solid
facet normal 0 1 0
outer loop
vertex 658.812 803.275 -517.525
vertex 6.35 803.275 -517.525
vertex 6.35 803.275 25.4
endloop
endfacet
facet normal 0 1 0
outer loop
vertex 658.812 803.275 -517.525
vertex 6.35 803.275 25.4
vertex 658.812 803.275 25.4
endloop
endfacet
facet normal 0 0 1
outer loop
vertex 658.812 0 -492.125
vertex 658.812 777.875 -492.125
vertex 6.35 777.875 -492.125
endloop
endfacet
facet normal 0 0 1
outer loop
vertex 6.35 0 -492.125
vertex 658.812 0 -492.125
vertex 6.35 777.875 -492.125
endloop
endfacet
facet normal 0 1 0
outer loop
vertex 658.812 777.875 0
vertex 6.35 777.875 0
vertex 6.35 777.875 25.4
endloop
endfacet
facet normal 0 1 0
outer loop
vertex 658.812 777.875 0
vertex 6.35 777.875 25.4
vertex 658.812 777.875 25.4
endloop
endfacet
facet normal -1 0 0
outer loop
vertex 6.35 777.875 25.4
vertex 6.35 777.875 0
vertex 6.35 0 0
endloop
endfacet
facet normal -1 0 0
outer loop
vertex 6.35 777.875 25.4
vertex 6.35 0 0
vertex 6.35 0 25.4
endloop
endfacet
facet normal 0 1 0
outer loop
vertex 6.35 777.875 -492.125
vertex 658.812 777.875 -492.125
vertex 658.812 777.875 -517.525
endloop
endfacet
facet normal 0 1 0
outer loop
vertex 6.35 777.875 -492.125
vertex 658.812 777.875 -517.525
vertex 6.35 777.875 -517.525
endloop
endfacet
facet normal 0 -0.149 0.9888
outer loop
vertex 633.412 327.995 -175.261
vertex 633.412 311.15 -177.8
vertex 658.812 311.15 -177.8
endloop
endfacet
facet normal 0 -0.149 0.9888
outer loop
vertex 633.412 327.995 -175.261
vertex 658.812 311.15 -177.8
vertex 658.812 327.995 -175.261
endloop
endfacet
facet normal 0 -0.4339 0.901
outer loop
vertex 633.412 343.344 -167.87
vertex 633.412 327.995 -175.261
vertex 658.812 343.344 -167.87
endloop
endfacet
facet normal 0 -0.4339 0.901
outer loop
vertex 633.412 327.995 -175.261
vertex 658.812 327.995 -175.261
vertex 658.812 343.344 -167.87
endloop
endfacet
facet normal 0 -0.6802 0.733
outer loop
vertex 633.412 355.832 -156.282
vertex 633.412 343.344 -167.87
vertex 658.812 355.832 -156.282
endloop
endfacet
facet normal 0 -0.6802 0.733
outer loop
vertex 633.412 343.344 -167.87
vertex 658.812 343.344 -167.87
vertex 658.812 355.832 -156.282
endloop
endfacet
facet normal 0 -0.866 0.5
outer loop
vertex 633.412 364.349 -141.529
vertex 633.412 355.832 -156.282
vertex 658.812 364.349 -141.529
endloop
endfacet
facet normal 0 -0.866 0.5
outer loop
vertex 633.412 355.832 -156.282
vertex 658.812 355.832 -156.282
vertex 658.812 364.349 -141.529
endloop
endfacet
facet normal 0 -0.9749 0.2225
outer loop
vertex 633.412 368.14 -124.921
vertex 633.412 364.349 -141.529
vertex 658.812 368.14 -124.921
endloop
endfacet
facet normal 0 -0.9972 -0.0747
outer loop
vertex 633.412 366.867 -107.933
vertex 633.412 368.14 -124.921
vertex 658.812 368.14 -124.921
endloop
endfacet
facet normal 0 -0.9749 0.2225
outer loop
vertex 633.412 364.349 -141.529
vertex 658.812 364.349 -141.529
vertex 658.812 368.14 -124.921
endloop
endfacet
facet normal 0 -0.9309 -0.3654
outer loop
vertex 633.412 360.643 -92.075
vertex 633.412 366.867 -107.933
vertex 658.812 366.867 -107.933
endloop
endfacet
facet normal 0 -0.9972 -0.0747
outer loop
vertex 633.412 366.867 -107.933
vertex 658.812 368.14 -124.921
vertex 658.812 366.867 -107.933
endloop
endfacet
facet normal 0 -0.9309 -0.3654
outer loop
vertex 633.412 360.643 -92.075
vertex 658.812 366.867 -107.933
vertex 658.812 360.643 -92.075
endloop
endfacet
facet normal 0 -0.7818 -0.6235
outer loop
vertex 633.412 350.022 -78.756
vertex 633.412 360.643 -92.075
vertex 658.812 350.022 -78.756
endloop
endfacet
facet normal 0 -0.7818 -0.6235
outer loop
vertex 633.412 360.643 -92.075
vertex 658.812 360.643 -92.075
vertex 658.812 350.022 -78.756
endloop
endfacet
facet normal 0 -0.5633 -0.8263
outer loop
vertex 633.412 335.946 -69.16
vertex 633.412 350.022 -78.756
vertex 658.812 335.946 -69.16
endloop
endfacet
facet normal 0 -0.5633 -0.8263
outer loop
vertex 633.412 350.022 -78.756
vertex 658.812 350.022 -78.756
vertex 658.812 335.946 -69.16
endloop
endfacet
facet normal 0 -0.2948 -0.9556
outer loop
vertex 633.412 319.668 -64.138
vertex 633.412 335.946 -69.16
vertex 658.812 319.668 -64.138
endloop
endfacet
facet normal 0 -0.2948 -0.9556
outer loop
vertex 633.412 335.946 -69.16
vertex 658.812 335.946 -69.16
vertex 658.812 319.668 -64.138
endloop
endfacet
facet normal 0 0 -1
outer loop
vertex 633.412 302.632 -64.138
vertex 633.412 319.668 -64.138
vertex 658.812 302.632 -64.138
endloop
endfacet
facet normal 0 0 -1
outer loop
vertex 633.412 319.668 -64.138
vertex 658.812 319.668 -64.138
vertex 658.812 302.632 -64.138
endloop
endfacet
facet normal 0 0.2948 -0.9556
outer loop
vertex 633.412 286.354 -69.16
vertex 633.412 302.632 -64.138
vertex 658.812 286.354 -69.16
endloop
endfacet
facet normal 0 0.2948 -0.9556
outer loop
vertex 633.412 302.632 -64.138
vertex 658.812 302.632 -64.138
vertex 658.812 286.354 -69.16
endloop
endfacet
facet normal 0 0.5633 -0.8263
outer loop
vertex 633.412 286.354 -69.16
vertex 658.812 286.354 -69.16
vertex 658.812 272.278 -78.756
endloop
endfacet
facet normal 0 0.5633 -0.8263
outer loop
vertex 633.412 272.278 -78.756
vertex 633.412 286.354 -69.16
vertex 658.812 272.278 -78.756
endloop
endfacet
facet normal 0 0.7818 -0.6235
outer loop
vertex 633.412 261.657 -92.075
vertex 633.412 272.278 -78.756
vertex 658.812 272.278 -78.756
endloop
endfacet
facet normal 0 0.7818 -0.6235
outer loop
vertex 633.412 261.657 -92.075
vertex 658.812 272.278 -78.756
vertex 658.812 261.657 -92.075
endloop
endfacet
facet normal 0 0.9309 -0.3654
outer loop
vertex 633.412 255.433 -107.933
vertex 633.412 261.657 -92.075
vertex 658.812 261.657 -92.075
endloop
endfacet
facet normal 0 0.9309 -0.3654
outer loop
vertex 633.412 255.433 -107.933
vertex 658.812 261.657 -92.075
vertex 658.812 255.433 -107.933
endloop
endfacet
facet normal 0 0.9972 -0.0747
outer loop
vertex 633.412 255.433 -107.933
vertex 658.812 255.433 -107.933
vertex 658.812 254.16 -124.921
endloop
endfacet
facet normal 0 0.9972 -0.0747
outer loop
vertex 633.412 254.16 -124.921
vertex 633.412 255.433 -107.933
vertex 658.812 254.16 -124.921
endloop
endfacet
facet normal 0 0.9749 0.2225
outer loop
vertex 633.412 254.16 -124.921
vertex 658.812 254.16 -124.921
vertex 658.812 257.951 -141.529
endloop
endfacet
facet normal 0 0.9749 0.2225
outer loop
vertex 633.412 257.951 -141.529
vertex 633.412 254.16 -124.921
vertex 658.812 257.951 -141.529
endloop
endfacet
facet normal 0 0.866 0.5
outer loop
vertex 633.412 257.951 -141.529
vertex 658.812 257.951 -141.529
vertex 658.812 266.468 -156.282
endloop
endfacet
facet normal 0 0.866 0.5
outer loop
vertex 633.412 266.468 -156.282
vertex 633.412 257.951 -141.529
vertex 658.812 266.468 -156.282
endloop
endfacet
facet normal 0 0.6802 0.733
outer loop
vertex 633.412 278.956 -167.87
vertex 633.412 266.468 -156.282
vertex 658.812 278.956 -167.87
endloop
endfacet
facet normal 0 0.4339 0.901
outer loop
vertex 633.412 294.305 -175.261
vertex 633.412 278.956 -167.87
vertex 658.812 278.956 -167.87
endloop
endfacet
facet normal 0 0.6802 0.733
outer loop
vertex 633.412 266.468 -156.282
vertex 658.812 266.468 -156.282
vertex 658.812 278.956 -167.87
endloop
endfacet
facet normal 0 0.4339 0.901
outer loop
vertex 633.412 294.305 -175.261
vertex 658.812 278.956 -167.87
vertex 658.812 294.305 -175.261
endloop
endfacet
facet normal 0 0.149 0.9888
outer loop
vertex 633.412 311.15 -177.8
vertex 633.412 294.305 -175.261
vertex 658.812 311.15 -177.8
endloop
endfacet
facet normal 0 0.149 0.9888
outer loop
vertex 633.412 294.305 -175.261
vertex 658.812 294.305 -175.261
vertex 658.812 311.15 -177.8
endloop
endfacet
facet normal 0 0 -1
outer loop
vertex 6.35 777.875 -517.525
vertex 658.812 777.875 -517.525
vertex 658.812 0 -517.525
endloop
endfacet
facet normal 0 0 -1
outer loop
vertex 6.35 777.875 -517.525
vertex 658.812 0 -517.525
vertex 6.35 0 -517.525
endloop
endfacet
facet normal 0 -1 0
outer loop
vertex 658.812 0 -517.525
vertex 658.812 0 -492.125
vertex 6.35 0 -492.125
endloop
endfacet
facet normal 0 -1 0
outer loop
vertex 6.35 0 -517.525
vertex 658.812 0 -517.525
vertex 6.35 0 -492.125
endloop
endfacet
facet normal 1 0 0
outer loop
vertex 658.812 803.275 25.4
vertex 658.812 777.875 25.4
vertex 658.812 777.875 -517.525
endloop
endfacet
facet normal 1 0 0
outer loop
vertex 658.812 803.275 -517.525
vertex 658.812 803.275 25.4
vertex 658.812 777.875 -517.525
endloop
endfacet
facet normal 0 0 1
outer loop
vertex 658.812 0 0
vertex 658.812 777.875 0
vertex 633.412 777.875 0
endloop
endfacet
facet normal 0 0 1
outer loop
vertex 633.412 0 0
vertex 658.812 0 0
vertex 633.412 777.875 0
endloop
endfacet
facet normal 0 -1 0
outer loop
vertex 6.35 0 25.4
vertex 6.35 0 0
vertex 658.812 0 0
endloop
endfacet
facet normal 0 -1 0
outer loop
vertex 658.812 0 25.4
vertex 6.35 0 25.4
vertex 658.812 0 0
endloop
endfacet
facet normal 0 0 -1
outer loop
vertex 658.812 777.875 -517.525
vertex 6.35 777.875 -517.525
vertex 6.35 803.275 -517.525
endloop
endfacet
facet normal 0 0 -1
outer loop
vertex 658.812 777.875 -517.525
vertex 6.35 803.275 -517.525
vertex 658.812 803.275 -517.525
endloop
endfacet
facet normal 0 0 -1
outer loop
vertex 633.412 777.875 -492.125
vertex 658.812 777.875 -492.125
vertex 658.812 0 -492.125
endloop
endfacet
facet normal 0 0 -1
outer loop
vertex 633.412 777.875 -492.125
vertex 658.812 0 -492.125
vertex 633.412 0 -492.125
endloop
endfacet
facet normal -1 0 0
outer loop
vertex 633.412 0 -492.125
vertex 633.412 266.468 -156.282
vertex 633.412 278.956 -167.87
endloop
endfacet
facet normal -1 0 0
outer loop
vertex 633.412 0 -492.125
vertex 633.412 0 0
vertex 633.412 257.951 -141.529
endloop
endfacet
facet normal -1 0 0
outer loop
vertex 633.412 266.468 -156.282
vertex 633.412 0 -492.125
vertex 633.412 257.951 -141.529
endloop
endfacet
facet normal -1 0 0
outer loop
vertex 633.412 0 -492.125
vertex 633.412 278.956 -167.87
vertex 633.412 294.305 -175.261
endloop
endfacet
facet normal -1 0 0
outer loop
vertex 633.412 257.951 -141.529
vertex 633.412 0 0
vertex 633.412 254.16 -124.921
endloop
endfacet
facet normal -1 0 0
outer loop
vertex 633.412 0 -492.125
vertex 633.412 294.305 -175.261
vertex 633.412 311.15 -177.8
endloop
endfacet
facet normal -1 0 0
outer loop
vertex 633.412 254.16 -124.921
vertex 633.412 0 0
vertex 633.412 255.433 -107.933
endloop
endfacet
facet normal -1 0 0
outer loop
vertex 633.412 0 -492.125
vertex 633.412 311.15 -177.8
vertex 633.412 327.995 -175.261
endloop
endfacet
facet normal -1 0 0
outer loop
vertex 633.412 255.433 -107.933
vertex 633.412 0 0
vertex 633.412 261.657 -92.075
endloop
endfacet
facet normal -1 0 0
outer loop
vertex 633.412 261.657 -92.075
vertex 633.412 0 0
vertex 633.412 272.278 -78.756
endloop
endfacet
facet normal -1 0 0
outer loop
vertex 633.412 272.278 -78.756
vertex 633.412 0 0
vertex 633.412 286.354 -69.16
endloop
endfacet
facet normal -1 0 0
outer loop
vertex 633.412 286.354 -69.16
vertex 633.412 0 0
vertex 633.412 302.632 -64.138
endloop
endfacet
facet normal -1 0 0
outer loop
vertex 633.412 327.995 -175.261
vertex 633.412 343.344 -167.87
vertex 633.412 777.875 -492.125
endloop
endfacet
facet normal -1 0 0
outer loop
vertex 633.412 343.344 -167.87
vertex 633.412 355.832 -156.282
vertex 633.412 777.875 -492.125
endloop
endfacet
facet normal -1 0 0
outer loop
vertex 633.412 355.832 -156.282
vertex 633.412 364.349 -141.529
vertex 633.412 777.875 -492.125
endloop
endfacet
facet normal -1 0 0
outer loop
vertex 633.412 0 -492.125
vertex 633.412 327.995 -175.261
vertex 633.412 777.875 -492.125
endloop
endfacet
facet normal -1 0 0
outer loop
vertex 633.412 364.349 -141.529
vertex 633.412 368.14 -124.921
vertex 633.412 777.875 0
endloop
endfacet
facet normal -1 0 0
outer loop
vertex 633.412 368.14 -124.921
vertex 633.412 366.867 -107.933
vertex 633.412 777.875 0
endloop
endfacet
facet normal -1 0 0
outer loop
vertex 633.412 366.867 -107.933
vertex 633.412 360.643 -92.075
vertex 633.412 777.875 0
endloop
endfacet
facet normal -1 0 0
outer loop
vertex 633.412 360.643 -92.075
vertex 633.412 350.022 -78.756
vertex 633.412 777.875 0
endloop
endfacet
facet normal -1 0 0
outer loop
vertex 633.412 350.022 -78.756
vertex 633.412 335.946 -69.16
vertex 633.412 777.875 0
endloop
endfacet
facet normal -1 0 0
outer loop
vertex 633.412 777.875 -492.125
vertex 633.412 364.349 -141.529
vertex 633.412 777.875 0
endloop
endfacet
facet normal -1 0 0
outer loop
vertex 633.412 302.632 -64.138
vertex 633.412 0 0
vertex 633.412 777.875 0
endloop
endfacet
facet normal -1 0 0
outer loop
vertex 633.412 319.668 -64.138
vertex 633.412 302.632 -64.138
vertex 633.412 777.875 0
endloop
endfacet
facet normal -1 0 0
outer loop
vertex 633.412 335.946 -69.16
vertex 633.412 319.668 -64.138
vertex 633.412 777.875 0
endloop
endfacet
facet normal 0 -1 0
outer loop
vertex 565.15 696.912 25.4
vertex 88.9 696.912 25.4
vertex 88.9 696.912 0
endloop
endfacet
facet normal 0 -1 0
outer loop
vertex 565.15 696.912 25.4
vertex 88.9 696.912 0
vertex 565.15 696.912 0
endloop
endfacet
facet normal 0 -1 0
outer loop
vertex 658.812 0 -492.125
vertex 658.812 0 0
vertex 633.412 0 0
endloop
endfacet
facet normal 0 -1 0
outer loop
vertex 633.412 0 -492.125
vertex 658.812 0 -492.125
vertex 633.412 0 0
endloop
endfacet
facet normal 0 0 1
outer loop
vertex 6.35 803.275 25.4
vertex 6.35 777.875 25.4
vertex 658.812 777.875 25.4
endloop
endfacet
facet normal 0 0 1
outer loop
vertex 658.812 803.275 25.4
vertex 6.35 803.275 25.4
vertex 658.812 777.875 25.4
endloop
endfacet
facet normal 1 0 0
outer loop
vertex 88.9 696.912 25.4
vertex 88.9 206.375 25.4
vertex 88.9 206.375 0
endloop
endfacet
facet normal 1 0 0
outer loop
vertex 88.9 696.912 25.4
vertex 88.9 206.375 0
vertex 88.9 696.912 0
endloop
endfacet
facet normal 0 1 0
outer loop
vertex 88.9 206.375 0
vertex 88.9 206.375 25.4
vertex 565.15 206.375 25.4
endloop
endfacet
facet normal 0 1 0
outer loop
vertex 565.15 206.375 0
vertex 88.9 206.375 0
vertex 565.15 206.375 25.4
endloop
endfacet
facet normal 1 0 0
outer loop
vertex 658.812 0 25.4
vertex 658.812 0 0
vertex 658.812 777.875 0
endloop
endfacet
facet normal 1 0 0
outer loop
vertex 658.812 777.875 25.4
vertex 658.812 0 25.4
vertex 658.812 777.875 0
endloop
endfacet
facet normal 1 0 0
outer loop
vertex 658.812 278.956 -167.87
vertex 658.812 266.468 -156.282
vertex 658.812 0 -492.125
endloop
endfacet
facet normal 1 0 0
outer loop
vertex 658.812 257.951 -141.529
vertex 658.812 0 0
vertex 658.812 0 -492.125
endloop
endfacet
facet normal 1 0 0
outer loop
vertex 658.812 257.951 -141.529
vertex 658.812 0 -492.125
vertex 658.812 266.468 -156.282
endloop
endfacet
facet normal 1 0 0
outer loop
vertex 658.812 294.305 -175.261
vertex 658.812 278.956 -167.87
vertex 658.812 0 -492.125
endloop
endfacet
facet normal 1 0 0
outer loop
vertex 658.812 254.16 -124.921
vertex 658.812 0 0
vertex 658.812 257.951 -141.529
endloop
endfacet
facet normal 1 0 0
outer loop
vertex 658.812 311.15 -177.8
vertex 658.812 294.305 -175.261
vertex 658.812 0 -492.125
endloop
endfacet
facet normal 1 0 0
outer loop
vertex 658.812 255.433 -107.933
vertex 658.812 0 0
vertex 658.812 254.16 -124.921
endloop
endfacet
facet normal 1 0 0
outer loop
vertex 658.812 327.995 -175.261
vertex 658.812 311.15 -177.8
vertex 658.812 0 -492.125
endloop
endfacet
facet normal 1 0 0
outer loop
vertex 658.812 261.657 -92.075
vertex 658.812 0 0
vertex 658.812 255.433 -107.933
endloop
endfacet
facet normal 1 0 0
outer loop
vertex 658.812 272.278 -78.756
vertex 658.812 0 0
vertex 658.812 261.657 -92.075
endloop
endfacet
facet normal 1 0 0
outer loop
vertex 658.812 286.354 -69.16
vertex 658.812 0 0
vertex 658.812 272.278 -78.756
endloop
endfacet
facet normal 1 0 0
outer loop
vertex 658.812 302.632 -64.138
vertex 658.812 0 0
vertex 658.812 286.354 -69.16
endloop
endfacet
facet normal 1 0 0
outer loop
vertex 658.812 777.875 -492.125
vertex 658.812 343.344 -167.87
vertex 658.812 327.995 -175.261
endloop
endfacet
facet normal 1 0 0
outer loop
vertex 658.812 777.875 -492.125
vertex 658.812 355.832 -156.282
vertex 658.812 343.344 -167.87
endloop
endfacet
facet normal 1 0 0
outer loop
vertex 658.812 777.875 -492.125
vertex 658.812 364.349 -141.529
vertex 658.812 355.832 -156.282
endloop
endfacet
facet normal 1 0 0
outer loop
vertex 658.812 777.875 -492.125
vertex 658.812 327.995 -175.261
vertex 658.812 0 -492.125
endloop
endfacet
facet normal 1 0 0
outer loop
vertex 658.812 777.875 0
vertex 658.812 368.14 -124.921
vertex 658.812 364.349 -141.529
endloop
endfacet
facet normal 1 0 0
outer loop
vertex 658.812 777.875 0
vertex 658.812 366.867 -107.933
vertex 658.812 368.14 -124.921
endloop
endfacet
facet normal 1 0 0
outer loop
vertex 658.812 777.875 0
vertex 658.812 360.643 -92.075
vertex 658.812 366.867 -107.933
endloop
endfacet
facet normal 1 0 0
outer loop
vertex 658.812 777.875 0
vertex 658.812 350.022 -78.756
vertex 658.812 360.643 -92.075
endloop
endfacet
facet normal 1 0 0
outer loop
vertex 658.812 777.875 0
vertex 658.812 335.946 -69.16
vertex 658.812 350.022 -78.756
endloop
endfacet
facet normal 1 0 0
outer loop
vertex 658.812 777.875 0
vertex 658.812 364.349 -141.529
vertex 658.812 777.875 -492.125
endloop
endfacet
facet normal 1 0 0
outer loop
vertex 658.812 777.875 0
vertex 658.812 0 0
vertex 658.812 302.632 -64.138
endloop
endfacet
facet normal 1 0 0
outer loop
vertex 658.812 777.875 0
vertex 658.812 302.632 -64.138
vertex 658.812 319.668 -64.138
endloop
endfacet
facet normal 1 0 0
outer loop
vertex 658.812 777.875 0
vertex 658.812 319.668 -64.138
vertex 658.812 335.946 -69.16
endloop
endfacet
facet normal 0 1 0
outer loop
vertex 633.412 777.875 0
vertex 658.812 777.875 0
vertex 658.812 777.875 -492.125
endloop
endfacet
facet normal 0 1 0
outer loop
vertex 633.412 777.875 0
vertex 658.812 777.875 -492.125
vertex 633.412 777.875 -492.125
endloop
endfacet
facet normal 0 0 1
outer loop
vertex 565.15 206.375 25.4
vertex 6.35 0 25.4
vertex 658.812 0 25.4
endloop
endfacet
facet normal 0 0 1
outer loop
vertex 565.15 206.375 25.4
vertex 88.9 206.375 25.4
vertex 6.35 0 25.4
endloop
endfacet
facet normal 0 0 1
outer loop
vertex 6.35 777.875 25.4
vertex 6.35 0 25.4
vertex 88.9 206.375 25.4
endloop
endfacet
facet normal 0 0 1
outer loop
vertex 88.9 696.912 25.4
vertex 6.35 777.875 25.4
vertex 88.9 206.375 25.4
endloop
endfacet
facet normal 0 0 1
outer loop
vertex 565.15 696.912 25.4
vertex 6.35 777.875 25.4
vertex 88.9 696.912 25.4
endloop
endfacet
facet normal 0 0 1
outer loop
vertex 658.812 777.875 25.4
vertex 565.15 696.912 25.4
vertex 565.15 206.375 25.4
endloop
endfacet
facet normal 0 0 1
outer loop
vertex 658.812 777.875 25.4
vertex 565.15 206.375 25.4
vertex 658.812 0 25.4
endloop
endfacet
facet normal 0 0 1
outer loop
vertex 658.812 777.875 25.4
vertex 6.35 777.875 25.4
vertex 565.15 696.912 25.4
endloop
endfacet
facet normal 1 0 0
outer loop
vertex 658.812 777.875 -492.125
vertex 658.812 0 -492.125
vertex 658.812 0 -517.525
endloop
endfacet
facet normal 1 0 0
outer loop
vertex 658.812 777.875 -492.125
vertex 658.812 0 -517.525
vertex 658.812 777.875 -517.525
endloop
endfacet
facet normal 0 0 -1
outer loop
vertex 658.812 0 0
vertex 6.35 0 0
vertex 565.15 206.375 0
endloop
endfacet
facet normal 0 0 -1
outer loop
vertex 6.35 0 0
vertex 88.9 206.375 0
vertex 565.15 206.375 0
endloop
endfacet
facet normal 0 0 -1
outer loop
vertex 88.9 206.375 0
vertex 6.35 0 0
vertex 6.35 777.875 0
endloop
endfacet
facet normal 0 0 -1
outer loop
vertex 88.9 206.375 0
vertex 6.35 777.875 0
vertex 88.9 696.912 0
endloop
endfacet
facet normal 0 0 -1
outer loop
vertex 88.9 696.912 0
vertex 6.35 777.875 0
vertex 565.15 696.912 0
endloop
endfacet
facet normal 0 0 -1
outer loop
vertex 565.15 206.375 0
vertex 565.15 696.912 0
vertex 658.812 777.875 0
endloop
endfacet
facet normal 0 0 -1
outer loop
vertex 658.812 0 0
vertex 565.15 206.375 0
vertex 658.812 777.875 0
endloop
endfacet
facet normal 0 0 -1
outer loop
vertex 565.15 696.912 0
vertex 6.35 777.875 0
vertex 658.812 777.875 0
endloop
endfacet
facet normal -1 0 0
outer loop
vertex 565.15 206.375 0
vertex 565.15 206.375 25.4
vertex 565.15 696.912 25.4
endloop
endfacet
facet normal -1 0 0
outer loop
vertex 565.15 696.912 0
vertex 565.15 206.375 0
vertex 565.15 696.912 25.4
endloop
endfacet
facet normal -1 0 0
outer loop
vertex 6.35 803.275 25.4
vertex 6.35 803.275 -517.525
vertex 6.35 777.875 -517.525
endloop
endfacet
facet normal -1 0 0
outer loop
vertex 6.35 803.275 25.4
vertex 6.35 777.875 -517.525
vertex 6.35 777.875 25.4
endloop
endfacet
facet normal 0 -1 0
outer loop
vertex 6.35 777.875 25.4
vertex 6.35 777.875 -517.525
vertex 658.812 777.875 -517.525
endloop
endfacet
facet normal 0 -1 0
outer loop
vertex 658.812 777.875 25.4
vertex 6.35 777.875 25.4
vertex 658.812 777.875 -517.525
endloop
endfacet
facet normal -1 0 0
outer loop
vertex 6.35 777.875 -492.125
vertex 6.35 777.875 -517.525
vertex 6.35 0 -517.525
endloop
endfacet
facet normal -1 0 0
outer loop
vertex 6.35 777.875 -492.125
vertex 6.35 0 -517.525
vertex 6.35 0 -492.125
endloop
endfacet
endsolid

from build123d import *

# Parameters (mm, degrees)
SKETCH1_W           = 658.8125
SKETCH1_H           = 777.875
BOSS_EXTRUDE1_DEPTH = 25.4
SKETCH2_W           = 25.4
SKETCH2_H           = 777.875
BOSS_EXTRUDE2_DEPTH = 492.125
SKETCH3_W           = 658.8125
SKETCH3_H           = 777.875
BOSS_EXTRUDE3_DEPTH = 25.4
SKETCH4_W           = 658.8125
SKETCH4_H           = 542.925
BOSS_EXTRUDE4_DEPTH = 25.4
SKETCH5_W           = 542.925
SKETCH5_H           = 803.275
CUT_EXTRUDE1_DEPTH  = 6.35
SKETCH6_W           = 476.25
SKETCH6_H           = 490.5375
CUT_EXTRUDE2_DEPTH  = 25.4
SKETCH7_R           = 57.15
CUT_EXTRUDE3_DEPTH  = 25.4


with BuildPart() as part:
    # Sketch1 → Boss-Extrude1 (new body)
    with BuildSketch(Plane.XY):
        with Locations((329.40625, 388.9375)):
            Rectangle(SKETCH1_W, SKETCH1_H)
    extrude(amount=BOSS_EXTRUDE1_DEPTH)


with BuildPart() as body_2:
    # Sketch2 → Boss-Extrude2 (new body)
    with BuildSketch(Plane(origin=(0, 0, 0), x_dir=(-1, 0, 0), z_dir=(0, 0, -1))):
        with Locations((-646.1125, 388.9375)):
            Rectangle(SKETCH2_W, SKETCH2_H)
    extrude(amount=BOSS_EXTRUDE2_DEPTH)

    # Sketch7 → Cut-Extrude3 (cut)
    with BuildSketch(Plane(origin=(658.8125, 0, 0), x_dir=(0, 0, -1), z_dir=(1, 0, 0))):
        with Locations((120.65, 311.15)):
            Circle(SKETCH7_R)
    extrude(amount=-CUT_EXTRUDE3_DEPTH, mode=Mode.SUBTRACT)


with BuildPart() as body_3:
    # Sketch3 → Boss-Extrude3 (new body)
    with BuildSketch(Plane(origin=(0, 0, -492.125), x_dir=(-1, 0, 0), z_dir=(0, 0, -1))):
        with Locations((-329.40625, 388.9375)):
            Rectangle(SKETCH3_W, SKETCH3_H)
    extrude(amount=BOSS_EXTRUDE3_DEPTH)


with BuildPart() as body_4:
    # Sketch4 → Boss-Extrude4 (new body)
    with BuildSketch(Plane(origin=(0, 777.875, 0), x_dir=(1, 0, 0), z_dir=(0, 1, 0))):
        with Locations((329.40625, 246.0625)):
            Rectangle(SKETCH4_W, SKETCH4_H)
    extrude(amount=BOSS_EXTRUDE4_DEPTH)


with BuildPart() as cut_extrude1_tool:
    # Sketch5 → Cut-Extrude1 (new body)
    with BuildSketch(Plane.ZY):
        with Locations((-246.0625, 401.6375)):
            Rectangle(SKETCH5_W, SKETCH5_H)
    extrude(amount=-CUT_EXTRUDE1_DEPTH)


with BuildPart() as part_1:
    add(part.part)

    # Cut-Extrude1: cut by cut_extrude1_tool
    add(cut_extrude1_tool.part, mode=Mode.SUBTRACT)

    # Sketch6 → Cut-Extrude2 (cut)
    with BuildSketch(Plane.XY.offset(25.4)):
        with Locations((327.025, 451.64375)):
            Rectangle(SKETCH6_W, SKETCH6_H)
    extrude(amount=-CUT_EXTRUDE2_DEPTH, mode=Mode.SUBTRACT)


with BuildPart() as body_3_1:
    add(body_3.part)

    # Cut-Extrude1: cut by cut_extrude1_tool
    add(cut_extrude1_tool.part, mode=Mode.SUBTRACT)


with BuildPart() as body_4_1:
    add(body_4.part)

    # Cut-Extrude1: cut by cut_extrude1_tool
    add(cut_extrude1_tool.part, mode=Mode.SUBTRACT)


solid = Compound([body_2.part, part_1.part, body_3_1.part, body_4_1.part])
